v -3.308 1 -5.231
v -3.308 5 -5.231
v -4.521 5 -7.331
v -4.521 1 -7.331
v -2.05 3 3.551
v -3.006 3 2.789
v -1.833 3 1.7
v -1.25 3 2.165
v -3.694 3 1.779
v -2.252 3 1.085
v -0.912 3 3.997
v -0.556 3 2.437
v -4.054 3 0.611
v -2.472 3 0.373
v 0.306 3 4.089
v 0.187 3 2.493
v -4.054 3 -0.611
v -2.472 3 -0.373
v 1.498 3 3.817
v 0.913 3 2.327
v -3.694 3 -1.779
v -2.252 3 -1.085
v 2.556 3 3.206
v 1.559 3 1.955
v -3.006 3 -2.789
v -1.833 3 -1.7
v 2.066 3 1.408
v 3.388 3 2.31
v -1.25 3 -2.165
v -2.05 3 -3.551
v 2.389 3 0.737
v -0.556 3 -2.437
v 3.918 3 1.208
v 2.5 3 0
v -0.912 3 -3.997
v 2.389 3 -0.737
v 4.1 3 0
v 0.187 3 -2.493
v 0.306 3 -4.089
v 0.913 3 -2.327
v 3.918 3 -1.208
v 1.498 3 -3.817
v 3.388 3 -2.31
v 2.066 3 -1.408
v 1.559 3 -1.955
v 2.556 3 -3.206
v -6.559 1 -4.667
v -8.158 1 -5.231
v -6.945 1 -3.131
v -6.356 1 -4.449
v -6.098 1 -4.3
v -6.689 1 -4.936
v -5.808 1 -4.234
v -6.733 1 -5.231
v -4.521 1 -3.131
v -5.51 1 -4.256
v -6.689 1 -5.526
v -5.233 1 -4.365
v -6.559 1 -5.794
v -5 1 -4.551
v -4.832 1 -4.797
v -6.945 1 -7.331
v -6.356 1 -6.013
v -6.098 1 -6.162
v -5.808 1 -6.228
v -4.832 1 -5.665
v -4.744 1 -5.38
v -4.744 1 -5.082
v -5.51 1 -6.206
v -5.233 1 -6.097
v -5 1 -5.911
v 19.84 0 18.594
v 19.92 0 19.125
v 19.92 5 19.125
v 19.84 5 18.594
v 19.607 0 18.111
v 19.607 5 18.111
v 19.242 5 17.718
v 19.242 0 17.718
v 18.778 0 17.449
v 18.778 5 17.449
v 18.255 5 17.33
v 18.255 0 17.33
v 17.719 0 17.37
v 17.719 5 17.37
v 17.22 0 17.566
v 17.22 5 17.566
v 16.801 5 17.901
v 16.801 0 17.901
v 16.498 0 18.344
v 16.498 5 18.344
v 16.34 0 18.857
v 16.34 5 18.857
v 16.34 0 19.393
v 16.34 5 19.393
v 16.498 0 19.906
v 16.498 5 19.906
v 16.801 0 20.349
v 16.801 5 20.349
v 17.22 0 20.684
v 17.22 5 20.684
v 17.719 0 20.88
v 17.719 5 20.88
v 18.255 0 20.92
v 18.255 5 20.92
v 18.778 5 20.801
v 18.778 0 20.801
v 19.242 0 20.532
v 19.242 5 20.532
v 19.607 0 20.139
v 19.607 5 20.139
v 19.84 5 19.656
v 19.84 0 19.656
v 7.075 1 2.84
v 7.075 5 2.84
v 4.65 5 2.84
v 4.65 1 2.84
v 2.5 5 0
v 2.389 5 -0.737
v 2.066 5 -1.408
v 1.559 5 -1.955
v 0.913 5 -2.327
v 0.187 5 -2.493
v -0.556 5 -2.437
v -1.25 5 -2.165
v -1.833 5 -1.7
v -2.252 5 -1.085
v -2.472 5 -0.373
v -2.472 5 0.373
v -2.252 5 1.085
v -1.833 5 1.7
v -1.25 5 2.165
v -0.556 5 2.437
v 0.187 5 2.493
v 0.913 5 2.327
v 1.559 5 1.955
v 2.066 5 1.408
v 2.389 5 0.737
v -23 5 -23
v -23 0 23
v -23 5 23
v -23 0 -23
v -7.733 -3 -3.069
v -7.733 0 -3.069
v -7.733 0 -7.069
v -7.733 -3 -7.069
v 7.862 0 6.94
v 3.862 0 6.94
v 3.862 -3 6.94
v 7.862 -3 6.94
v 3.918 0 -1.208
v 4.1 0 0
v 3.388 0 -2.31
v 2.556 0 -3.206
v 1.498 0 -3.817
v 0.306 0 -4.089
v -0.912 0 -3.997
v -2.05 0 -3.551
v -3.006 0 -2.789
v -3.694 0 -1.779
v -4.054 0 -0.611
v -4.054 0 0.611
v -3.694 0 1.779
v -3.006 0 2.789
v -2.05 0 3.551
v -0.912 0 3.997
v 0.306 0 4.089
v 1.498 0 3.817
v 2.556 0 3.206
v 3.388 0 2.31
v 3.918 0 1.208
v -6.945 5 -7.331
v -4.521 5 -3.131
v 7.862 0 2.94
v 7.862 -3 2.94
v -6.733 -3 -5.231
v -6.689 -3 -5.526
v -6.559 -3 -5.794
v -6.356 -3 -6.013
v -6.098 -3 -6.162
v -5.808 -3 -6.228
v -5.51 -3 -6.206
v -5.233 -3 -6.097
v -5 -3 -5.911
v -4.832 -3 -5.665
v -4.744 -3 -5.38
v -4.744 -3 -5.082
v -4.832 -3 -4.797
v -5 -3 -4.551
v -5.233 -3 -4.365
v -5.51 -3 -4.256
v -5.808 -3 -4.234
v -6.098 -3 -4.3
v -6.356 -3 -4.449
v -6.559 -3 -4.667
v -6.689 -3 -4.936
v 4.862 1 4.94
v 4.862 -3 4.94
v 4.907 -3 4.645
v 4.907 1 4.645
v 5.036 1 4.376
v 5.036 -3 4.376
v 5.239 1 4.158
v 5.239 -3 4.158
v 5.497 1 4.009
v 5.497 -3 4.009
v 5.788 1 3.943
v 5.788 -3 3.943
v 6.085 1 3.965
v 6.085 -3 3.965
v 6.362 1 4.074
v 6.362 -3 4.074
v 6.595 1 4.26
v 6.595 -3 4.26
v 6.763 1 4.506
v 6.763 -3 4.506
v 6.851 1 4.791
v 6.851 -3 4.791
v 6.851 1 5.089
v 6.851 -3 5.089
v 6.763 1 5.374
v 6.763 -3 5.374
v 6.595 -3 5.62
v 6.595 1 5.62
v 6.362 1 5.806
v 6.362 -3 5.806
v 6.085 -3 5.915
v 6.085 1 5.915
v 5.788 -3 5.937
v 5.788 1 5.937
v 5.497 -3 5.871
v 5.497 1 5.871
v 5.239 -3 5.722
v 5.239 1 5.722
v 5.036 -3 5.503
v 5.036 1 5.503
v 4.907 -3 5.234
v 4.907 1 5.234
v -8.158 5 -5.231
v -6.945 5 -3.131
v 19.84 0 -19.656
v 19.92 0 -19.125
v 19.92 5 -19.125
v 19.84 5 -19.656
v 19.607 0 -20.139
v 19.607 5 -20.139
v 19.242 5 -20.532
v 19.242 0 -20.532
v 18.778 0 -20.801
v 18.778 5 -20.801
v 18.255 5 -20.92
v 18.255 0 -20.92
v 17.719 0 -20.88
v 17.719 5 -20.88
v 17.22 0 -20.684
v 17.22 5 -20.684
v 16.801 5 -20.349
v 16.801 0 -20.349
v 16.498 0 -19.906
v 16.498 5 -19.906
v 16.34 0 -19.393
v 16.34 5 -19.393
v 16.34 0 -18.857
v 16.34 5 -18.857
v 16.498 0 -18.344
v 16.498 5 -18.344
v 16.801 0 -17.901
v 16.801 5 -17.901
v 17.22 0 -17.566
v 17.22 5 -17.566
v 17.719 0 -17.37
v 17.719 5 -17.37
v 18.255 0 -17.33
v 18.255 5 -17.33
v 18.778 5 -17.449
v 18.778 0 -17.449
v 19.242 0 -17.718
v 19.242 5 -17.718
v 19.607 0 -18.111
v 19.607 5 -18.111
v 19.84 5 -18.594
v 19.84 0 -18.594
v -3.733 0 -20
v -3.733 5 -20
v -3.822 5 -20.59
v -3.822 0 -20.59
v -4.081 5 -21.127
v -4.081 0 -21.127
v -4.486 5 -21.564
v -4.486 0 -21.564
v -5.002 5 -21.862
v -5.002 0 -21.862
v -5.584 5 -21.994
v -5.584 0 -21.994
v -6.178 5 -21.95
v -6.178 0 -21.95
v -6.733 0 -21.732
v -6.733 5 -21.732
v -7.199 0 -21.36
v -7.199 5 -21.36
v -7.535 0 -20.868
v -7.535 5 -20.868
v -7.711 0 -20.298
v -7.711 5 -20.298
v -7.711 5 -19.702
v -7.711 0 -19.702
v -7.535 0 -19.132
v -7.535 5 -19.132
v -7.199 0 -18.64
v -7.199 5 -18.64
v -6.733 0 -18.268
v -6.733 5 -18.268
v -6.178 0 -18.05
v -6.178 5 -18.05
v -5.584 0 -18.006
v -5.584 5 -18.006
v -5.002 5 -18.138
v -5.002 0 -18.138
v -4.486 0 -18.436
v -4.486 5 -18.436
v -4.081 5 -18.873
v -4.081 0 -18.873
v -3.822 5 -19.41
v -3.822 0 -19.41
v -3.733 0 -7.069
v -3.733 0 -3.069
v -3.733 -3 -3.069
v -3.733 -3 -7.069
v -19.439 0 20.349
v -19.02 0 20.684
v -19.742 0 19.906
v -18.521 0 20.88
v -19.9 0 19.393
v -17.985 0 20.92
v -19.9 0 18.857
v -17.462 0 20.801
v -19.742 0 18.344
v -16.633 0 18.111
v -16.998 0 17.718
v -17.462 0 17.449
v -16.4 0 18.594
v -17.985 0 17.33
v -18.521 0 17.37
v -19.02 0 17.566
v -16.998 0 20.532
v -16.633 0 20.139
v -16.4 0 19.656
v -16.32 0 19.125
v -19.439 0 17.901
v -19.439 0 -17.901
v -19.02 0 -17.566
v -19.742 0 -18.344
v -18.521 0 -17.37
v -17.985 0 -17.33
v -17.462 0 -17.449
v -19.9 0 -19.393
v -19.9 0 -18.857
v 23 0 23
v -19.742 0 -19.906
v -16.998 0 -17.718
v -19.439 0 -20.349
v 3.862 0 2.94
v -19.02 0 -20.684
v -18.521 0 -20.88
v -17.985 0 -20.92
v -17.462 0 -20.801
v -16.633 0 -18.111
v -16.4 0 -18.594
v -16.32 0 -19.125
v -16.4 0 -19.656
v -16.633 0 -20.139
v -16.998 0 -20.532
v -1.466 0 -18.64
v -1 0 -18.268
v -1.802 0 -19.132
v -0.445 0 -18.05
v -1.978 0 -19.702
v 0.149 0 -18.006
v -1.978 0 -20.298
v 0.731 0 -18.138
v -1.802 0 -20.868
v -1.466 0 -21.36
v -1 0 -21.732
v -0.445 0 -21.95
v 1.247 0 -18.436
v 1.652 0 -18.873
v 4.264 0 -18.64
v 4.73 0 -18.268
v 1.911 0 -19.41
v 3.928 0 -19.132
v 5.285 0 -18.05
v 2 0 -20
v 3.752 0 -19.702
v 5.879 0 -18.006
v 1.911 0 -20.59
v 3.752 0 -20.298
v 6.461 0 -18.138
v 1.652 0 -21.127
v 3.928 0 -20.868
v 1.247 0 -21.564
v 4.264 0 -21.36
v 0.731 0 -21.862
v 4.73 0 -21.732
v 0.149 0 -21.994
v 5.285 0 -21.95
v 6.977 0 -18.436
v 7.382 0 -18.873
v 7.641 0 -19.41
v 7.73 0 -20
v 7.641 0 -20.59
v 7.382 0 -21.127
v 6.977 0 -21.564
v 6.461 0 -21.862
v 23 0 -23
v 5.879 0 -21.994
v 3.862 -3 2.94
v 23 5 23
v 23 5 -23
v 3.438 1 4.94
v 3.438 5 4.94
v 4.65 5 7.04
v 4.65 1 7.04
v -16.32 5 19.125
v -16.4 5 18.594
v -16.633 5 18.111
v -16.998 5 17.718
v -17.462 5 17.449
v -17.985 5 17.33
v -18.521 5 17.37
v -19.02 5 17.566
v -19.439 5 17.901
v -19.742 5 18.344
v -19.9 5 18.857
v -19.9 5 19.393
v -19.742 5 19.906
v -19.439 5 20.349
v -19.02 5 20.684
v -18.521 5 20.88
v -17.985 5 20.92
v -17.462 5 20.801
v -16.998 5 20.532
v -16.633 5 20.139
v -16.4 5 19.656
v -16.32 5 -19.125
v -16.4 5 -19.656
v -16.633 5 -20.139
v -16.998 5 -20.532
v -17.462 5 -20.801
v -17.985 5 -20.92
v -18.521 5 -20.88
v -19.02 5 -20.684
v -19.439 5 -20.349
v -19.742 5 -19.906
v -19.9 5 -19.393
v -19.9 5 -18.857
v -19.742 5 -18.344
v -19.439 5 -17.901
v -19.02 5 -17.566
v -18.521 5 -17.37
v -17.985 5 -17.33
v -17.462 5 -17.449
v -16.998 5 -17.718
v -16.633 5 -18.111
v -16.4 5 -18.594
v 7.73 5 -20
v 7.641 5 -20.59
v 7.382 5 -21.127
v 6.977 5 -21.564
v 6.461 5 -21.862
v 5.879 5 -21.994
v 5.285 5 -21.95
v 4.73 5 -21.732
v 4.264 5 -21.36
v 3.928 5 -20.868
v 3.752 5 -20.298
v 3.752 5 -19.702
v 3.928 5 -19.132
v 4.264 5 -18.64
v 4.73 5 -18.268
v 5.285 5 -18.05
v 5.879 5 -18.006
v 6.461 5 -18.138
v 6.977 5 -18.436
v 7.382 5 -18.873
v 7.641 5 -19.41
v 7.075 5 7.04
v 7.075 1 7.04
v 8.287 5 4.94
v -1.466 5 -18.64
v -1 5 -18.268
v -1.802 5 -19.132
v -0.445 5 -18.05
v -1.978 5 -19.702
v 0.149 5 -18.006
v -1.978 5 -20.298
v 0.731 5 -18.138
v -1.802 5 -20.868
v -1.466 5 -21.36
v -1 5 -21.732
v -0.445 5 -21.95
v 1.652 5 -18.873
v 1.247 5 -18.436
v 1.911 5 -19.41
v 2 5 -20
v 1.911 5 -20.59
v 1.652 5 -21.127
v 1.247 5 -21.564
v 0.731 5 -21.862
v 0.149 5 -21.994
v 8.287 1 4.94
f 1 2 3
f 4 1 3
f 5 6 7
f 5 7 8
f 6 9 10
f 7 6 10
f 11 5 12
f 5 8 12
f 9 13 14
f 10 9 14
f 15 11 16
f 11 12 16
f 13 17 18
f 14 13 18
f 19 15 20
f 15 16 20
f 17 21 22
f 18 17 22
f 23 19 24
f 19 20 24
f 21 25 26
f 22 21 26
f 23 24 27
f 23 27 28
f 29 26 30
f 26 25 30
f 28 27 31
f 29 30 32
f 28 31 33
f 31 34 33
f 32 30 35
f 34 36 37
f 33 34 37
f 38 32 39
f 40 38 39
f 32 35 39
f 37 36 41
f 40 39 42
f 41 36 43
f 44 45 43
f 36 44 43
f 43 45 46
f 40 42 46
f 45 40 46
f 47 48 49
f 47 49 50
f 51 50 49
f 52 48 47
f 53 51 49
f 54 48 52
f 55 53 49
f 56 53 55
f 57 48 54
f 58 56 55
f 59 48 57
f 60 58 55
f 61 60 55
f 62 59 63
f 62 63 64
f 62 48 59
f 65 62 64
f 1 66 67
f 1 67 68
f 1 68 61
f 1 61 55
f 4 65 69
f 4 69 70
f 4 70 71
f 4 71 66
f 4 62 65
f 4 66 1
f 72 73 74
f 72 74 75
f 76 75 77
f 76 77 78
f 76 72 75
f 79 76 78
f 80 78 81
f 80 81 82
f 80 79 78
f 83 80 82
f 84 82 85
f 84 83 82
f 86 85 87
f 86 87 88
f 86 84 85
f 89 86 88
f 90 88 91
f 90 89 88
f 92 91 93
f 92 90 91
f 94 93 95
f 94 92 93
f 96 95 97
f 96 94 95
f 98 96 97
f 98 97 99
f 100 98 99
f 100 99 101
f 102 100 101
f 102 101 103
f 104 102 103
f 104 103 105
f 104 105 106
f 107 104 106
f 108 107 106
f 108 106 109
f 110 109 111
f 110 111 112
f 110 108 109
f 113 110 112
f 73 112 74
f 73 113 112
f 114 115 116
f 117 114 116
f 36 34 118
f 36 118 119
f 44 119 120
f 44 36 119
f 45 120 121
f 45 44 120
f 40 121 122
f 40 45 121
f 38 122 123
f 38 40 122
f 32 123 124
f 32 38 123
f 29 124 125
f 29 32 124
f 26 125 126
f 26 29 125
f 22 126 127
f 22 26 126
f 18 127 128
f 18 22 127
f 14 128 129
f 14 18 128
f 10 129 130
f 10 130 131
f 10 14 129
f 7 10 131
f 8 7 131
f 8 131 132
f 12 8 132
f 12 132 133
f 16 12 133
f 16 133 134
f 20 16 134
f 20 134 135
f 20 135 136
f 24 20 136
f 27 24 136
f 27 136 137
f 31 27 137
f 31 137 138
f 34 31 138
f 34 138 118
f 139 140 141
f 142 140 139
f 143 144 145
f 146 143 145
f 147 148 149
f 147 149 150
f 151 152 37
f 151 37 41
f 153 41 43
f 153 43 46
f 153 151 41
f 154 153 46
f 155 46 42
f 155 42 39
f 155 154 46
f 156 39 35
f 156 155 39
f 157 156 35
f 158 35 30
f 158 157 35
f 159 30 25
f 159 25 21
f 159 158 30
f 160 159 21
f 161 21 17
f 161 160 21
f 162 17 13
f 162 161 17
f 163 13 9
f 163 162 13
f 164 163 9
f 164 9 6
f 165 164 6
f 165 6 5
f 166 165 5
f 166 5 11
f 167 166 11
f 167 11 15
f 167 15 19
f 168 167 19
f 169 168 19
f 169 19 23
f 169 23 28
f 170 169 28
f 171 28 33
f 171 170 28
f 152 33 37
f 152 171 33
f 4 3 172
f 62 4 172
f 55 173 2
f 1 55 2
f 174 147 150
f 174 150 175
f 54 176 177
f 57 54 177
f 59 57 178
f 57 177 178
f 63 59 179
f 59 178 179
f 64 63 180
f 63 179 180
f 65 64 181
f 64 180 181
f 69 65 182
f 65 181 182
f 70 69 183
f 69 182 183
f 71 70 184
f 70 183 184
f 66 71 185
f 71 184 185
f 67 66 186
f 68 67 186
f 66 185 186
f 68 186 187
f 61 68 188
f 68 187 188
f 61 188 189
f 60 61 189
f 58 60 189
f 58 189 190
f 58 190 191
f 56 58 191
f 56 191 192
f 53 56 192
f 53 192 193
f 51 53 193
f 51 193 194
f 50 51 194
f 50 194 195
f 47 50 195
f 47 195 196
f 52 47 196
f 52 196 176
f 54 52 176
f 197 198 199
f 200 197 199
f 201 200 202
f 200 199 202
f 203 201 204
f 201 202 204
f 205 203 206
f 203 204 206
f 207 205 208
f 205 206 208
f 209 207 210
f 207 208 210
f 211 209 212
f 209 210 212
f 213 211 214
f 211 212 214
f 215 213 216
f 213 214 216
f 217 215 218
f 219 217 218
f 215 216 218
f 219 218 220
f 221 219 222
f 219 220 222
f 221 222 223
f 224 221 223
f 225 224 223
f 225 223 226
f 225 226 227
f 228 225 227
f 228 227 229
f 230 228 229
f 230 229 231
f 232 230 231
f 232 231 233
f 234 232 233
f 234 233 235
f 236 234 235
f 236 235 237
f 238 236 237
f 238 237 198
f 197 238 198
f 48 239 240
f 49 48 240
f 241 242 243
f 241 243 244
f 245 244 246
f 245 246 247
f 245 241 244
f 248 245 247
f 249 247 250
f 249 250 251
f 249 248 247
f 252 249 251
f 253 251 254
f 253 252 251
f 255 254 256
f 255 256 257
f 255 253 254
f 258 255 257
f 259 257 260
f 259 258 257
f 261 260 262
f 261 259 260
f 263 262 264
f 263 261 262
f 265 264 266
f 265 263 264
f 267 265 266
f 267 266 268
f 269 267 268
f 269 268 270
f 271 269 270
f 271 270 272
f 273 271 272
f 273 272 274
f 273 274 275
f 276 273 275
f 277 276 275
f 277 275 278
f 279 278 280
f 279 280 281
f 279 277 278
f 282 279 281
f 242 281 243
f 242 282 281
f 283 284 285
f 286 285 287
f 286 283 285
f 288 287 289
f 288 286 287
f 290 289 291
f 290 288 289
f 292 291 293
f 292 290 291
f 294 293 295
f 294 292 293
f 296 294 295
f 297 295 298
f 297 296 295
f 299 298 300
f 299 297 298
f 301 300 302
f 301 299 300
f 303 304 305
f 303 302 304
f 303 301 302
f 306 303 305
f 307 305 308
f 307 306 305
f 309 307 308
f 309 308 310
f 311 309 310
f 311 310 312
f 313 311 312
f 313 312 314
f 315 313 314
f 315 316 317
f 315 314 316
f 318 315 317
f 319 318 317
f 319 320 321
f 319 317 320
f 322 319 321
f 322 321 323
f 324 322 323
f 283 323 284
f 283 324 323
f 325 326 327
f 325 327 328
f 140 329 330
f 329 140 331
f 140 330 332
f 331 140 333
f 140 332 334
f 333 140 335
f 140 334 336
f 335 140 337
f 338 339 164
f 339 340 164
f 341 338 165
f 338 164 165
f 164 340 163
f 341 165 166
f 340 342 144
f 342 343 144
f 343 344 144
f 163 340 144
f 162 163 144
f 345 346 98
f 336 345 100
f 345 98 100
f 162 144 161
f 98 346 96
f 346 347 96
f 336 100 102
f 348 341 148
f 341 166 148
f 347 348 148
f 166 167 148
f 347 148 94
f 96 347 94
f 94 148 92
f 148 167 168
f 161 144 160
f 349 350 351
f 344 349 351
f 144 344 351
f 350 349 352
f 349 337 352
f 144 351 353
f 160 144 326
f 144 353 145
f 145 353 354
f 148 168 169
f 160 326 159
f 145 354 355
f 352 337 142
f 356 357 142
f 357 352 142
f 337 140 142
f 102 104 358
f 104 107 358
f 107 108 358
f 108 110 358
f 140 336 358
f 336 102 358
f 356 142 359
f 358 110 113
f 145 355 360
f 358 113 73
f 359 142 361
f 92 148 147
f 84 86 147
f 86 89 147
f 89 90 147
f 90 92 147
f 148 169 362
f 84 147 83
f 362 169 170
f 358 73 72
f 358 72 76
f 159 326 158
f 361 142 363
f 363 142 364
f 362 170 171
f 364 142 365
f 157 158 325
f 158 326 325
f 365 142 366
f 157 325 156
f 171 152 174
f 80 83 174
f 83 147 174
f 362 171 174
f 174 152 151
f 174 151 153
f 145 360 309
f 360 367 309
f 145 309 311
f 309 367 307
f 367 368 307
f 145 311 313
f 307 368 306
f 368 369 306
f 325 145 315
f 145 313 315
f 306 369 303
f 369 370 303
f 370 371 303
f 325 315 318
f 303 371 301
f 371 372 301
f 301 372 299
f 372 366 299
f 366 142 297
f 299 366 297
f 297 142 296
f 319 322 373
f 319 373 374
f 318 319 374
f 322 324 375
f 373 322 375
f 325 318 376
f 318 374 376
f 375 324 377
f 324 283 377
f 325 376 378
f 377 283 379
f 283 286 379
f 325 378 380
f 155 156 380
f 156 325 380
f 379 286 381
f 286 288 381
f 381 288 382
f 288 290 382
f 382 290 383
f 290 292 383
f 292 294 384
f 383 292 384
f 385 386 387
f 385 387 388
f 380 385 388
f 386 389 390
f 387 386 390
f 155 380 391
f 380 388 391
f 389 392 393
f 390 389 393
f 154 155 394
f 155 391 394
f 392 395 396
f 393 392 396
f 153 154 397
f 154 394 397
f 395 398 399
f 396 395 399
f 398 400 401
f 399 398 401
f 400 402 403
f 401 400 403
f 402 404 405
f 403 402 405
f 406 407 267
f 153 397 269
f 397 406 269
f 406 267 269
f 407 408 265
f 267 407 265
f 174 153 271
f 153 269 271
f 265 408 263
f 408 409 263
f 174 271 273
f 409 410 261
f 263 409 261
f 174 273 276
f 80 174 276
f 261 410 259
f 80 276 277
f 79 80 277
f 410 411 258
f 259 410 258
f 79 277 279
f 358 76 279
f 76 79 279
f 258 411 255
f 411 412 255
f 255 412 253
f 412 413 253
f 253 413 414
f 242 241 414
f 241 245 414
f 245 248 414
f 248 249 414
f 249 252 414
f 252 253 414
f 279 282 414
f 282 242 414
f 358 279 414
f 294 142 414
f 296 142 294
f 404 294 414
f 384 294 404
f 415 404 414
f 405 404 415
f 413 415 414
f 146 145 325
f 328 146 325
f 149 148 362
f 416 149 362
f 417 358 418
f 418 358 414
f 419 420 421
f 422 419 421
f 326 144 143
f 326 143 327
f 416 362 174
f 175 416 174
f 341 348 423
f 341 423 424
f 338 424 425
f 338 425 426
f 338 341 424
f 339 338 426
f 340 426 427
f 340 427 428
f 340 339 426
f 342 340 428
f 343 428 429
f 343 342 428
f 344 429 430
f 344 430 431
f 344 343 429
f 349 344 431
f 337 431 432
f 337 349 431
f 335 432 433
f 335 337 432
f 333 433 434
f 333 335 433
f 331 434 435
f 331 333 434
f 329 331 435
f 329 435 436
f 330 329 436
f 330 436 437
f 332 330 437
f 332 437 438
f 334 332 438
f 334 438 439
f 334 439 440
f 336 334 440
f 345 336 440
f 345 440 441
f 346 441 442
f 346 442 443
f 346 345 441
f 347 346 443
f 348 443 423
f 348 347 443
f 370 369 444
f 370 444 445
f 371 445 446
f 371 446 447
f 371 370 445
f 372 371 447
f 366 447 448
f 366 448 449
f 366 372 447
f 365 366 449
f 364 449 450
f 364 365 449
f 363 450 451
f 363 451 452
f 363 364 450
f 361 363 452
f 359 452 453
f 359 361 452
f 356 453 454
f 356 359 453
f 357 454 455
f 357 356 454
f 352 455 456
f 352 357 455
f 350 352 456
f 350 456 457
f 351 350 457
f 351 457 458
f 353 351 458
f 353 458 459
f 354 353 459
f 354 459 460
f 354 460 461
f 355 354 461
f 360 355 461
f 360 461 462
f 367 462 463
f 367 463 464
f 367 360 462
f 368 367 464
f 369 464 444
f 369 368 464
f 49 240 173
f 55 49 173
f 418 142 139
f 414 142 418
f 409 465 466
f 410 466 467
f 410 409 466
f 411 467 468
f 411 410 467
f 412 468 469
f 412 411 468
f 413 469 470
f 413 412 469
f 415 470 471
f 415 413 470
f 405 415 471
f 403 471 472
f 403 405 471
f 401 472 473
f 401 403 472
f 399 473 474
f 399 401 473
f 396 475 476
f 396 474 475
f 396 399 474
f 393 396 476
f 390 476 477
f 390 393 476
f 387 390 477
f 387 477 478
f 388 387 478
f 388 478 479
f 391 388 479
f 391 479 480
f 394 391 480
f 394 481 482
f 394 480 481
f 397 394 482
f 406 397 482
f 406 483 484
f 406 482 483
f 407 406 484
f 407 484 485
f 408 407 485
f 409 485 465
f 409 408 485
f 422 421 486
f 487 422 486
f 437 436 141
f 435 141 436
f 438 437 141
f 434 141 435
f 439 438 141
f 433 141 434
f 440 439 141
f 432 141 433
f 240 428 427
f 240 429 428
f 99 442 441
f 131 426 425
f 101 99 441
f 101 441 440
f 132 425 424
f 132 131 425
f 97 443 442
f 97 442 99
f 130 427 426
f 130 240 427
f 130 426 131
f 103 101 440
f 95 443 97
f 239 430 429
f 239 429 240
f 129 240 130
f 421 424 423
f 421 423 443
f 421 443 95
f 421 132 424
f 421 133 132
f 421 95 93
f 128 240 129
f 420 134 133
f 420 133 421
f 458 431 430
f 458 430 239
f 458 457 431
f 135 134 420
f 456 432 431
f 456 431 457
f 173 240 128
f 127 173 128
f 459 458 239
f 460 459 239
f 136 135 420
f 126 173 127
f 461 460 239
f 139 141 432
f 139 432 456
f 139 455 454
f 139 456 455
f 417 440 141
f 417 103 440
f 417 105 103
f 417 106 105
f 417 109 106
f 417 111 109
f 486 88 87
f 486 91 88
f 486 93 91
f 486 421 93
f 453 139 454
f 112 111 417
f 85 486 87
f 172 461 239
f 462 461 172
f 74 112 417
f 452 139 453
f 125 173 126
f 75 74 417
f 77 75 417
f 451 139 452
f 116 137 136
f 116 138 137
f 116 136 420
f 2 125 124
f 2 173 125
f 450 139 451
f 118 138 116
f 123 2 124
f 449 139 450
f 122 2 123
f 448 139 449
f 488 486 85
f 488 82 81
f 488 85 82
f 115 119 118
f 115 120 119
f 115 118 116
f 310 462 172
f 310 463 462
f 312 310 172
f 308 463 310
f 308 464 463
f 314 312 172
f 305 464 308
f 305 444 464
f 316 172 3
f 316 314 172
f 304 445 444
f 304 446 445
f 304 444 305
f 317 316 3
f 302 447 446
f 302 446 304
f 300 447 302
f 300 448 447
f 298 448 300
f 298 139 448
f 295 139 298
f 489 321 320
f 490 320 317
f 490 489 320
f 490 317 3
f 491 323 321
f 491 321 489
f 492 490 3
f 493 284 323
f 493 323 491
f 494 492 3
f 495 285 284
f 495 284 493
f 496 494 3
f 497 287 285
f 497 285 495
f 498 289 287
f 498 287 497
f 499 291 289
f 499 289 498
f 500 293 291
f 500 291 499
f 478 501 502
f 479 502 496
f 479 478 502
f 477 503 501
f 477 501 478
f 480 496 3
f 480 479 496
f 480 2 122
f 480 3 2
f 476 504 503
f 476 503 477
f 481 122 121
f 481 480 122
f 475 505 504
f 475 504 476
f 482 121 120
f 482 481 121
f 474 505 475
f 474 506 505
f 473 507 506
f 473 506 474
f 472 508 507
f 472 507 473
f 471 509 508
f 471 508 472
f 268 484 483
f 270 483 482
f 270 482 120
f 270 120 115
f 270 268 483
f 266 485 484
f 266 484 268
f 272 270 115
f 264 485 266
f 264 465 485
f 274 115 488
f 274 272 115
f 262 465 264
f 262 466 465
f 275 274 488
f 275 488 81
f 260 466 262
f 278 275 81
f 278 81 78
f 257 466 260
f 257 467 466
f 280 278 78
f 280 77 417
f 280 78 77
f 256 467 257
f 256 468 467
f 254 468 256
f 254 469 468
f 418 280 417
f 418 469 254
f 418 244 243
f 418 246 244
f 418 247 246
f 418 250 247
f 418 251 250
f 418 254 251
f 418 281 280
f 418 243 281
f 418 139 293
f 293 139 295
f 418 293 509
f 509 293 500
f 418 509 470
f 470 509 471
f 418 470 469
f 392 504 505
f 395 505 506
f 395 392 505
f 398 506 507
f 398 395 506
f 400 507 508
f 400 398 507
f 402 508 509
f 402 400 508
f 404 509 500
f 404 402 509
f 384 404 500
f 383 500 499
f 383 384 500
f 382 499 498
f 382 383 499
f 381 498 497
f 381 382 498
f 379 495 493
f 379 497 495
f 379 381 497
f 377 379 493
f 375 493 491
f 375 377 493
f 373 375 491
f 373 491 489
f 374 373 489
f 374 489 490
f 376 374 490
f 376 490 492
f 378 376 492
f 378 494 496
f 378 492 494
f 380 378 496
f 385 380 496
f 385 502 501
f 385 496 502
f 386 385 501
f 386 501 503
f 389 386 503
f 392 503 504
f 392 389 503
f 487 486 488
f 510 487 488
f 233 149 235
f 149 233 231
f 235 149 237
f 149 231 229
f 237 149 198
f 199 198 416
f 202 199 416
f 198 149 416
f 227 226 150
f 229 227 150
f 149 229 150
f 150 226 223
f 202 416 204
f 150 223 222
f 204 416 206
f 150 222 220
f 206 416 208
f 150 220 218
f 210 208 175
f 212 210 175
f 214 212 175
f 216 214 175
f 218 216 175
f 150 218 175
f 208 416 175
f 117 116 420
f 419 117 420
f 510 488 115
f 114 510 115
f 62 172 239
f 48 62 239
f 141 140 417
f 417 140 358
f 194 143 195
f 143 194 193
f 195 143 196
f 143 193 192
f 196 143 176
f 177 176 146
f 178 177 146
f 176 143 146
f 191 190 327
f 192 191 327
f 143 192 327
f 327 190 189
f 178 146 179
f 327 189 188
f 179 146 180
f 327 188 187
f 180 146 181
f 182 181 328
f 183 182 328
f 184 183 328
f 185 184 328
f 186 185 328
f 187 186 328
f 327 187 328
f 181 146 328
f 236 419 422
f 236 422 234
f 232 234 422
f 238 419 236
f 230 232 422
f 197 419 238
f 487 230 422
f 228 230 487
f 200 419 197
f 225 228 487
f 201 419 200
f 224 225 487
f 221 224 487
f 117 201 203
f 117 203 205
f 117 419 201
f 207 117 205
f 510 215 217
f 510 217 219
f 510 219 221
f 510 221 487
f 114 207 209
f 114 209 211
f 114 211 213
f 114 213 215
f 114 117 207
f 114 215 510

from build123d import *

# Parameters (mm, degrees)
SKETCH2_W           = 46
SKETCH2_H           = 46
BOSS_EXTRUDE1_DEPTH = 5
SKETCH3_R           = 1.8
SKETCH3_R_2         = 2.5
CUT_EXTRUDE1_DEPTH  = 5
SKETCH4_R           = 4.1
CUT_EXTRUDE2_DEPTH  = 3
SKETCH5_W           = 4
SKETCH5_H           = 4
BOSS_EXTRUDE2_DEPTH = 3
SKETCH6_R           = 1
CUT_EXTRUDE3_DEPTH  = 9
CUT_EXTRUDE5_DEPTH  = 4
SKETCH9_R           = 2
CUT_EXTRUDE6_DEPTH  = 6


with BuildPart() as part:
    # Sketch2 → Boss-Extrude1 (new body)
    with BuildSketch(Plane(origin=(0, 0, 0), x_dir=(1, 0, 0), z_dir=(0, 1, 0))):
        Rectangle(SKETCH2_W, SKETCH2_H)
    extrude(amount=BOSS_EXTRUDE1_DEPTH)

    # Sketch3 → Cut-Extrude1 (cut)
    with BuildSketch(Plane(origin=(0, 0, 0), x_dir=(1, 0, 0), z_dir=(0, 1, 0))):
        with Locations((-18.12, 19.125)):
            Circle(SKETCH3_R)
        with Locations((18.12, 19.125)):
            Circle(SKETCH3_R)
        with Locations((18.12, -19.125)):
            Circle(SKETCH3_R)
        with Locations((-18.12, -19.125)):
            Circle(SKETCH3_R)
        Circle(SKETCH3_R_2)
    extrude(amount=CUT_EXTRUDE1_DEPTH, mode=Mode.SUBTRACT)

    # Sketch4 → Cut-Extrude2 (cut)
    with BuildSketch(Plane(origin=(0, 0, 0), x_dir=(1, 0, 0), z_dir=(0, 1, 0))):
        Circle(SKETCH4_R)
    extrude(amount=CUT_EXTRUDE2_DEPTH, mode=Mode.SUBTRACT)

    # Sketch5 → Boss-Extrude2 (add)
    with BuildSketch(Plane(origin=(0, 0, 0), x_dir=(1, 0, 0), z_dir=(0, 1, 0))):
        with Locations((-5.7330026, 5.06948708)):
            Rectangle(SKETCH5_W, SKETCH5_H)
        with Locations((5.862376563, -4.939727226)):
            Rectangle(SKETCH5_W, SKETCH5_H)
    extrude(amount=-BOSS_EXTRUDE2_DEPTH)

    # Sketch6 → Cut-Extrude3 (cut, through all)
    with BuildSketch(Plane(origin=(0, -3, 0), x_dir=(-1, 0, 0), z_dir=(0, -1, 0))):
        with Locations((5.7330026, 5.230811807)):
            Circle(SKETCH6_R)
        with Locations((-5.862376563, -4.939727226)):
            Circle(SKETCH6_R)
    extrude(amount=-CUT_EXTRUDE3_DEPTH, mode=Mode.SUBTRACT)

    # Sketch8 → Cut-Extrude5 (cut)
    with BuildSketch(Plane(origin=(0, 5, 0), x_dir=(1, 0, 0), z_dir=(0, 1, 0))):
        Polygon((8.287247693, -4.939727226), (7.074812128, -2.839727226), (4.649940998, -2.839727226), (3.437505432, -4.939727226), (4.649940998, -7.039727226), (7.074812128, -7.039727226), align=None)
        Polygon((-3.30813147, 5.230811807), (-4.520567035, 7.330811807), (-6.945438166, 7.330811807), (-8.157873731, 5.230811807), (-6.945438166, 3.130811807), (-4.520567035, 3.130811807), align=None)
    extrude(amount=-CUT_EXTRUDE5_DEPTH, mode=Mode.SUBTRACT)

    # Sketch9 → Cut-Extrude6 (cut, through all)
    with BuildSketch(Plane(origin=(0, 0, 0), x_dir=(1, 0, 0), z_dir=(0, 1, 0))):
        with Locations((-5.7330026, 20)):
            Circle(SKETCH9_R)
        with Locations((5.73, 20)):
            Circle(SKETCH9_R)
        with Locations((0, 20)):
            Circle(SKETCH9_R)
    extrude(amount=CUT_EXTRUDE6_DEPTH, mode=Mode.SUBTRACT)


solid = part.part
